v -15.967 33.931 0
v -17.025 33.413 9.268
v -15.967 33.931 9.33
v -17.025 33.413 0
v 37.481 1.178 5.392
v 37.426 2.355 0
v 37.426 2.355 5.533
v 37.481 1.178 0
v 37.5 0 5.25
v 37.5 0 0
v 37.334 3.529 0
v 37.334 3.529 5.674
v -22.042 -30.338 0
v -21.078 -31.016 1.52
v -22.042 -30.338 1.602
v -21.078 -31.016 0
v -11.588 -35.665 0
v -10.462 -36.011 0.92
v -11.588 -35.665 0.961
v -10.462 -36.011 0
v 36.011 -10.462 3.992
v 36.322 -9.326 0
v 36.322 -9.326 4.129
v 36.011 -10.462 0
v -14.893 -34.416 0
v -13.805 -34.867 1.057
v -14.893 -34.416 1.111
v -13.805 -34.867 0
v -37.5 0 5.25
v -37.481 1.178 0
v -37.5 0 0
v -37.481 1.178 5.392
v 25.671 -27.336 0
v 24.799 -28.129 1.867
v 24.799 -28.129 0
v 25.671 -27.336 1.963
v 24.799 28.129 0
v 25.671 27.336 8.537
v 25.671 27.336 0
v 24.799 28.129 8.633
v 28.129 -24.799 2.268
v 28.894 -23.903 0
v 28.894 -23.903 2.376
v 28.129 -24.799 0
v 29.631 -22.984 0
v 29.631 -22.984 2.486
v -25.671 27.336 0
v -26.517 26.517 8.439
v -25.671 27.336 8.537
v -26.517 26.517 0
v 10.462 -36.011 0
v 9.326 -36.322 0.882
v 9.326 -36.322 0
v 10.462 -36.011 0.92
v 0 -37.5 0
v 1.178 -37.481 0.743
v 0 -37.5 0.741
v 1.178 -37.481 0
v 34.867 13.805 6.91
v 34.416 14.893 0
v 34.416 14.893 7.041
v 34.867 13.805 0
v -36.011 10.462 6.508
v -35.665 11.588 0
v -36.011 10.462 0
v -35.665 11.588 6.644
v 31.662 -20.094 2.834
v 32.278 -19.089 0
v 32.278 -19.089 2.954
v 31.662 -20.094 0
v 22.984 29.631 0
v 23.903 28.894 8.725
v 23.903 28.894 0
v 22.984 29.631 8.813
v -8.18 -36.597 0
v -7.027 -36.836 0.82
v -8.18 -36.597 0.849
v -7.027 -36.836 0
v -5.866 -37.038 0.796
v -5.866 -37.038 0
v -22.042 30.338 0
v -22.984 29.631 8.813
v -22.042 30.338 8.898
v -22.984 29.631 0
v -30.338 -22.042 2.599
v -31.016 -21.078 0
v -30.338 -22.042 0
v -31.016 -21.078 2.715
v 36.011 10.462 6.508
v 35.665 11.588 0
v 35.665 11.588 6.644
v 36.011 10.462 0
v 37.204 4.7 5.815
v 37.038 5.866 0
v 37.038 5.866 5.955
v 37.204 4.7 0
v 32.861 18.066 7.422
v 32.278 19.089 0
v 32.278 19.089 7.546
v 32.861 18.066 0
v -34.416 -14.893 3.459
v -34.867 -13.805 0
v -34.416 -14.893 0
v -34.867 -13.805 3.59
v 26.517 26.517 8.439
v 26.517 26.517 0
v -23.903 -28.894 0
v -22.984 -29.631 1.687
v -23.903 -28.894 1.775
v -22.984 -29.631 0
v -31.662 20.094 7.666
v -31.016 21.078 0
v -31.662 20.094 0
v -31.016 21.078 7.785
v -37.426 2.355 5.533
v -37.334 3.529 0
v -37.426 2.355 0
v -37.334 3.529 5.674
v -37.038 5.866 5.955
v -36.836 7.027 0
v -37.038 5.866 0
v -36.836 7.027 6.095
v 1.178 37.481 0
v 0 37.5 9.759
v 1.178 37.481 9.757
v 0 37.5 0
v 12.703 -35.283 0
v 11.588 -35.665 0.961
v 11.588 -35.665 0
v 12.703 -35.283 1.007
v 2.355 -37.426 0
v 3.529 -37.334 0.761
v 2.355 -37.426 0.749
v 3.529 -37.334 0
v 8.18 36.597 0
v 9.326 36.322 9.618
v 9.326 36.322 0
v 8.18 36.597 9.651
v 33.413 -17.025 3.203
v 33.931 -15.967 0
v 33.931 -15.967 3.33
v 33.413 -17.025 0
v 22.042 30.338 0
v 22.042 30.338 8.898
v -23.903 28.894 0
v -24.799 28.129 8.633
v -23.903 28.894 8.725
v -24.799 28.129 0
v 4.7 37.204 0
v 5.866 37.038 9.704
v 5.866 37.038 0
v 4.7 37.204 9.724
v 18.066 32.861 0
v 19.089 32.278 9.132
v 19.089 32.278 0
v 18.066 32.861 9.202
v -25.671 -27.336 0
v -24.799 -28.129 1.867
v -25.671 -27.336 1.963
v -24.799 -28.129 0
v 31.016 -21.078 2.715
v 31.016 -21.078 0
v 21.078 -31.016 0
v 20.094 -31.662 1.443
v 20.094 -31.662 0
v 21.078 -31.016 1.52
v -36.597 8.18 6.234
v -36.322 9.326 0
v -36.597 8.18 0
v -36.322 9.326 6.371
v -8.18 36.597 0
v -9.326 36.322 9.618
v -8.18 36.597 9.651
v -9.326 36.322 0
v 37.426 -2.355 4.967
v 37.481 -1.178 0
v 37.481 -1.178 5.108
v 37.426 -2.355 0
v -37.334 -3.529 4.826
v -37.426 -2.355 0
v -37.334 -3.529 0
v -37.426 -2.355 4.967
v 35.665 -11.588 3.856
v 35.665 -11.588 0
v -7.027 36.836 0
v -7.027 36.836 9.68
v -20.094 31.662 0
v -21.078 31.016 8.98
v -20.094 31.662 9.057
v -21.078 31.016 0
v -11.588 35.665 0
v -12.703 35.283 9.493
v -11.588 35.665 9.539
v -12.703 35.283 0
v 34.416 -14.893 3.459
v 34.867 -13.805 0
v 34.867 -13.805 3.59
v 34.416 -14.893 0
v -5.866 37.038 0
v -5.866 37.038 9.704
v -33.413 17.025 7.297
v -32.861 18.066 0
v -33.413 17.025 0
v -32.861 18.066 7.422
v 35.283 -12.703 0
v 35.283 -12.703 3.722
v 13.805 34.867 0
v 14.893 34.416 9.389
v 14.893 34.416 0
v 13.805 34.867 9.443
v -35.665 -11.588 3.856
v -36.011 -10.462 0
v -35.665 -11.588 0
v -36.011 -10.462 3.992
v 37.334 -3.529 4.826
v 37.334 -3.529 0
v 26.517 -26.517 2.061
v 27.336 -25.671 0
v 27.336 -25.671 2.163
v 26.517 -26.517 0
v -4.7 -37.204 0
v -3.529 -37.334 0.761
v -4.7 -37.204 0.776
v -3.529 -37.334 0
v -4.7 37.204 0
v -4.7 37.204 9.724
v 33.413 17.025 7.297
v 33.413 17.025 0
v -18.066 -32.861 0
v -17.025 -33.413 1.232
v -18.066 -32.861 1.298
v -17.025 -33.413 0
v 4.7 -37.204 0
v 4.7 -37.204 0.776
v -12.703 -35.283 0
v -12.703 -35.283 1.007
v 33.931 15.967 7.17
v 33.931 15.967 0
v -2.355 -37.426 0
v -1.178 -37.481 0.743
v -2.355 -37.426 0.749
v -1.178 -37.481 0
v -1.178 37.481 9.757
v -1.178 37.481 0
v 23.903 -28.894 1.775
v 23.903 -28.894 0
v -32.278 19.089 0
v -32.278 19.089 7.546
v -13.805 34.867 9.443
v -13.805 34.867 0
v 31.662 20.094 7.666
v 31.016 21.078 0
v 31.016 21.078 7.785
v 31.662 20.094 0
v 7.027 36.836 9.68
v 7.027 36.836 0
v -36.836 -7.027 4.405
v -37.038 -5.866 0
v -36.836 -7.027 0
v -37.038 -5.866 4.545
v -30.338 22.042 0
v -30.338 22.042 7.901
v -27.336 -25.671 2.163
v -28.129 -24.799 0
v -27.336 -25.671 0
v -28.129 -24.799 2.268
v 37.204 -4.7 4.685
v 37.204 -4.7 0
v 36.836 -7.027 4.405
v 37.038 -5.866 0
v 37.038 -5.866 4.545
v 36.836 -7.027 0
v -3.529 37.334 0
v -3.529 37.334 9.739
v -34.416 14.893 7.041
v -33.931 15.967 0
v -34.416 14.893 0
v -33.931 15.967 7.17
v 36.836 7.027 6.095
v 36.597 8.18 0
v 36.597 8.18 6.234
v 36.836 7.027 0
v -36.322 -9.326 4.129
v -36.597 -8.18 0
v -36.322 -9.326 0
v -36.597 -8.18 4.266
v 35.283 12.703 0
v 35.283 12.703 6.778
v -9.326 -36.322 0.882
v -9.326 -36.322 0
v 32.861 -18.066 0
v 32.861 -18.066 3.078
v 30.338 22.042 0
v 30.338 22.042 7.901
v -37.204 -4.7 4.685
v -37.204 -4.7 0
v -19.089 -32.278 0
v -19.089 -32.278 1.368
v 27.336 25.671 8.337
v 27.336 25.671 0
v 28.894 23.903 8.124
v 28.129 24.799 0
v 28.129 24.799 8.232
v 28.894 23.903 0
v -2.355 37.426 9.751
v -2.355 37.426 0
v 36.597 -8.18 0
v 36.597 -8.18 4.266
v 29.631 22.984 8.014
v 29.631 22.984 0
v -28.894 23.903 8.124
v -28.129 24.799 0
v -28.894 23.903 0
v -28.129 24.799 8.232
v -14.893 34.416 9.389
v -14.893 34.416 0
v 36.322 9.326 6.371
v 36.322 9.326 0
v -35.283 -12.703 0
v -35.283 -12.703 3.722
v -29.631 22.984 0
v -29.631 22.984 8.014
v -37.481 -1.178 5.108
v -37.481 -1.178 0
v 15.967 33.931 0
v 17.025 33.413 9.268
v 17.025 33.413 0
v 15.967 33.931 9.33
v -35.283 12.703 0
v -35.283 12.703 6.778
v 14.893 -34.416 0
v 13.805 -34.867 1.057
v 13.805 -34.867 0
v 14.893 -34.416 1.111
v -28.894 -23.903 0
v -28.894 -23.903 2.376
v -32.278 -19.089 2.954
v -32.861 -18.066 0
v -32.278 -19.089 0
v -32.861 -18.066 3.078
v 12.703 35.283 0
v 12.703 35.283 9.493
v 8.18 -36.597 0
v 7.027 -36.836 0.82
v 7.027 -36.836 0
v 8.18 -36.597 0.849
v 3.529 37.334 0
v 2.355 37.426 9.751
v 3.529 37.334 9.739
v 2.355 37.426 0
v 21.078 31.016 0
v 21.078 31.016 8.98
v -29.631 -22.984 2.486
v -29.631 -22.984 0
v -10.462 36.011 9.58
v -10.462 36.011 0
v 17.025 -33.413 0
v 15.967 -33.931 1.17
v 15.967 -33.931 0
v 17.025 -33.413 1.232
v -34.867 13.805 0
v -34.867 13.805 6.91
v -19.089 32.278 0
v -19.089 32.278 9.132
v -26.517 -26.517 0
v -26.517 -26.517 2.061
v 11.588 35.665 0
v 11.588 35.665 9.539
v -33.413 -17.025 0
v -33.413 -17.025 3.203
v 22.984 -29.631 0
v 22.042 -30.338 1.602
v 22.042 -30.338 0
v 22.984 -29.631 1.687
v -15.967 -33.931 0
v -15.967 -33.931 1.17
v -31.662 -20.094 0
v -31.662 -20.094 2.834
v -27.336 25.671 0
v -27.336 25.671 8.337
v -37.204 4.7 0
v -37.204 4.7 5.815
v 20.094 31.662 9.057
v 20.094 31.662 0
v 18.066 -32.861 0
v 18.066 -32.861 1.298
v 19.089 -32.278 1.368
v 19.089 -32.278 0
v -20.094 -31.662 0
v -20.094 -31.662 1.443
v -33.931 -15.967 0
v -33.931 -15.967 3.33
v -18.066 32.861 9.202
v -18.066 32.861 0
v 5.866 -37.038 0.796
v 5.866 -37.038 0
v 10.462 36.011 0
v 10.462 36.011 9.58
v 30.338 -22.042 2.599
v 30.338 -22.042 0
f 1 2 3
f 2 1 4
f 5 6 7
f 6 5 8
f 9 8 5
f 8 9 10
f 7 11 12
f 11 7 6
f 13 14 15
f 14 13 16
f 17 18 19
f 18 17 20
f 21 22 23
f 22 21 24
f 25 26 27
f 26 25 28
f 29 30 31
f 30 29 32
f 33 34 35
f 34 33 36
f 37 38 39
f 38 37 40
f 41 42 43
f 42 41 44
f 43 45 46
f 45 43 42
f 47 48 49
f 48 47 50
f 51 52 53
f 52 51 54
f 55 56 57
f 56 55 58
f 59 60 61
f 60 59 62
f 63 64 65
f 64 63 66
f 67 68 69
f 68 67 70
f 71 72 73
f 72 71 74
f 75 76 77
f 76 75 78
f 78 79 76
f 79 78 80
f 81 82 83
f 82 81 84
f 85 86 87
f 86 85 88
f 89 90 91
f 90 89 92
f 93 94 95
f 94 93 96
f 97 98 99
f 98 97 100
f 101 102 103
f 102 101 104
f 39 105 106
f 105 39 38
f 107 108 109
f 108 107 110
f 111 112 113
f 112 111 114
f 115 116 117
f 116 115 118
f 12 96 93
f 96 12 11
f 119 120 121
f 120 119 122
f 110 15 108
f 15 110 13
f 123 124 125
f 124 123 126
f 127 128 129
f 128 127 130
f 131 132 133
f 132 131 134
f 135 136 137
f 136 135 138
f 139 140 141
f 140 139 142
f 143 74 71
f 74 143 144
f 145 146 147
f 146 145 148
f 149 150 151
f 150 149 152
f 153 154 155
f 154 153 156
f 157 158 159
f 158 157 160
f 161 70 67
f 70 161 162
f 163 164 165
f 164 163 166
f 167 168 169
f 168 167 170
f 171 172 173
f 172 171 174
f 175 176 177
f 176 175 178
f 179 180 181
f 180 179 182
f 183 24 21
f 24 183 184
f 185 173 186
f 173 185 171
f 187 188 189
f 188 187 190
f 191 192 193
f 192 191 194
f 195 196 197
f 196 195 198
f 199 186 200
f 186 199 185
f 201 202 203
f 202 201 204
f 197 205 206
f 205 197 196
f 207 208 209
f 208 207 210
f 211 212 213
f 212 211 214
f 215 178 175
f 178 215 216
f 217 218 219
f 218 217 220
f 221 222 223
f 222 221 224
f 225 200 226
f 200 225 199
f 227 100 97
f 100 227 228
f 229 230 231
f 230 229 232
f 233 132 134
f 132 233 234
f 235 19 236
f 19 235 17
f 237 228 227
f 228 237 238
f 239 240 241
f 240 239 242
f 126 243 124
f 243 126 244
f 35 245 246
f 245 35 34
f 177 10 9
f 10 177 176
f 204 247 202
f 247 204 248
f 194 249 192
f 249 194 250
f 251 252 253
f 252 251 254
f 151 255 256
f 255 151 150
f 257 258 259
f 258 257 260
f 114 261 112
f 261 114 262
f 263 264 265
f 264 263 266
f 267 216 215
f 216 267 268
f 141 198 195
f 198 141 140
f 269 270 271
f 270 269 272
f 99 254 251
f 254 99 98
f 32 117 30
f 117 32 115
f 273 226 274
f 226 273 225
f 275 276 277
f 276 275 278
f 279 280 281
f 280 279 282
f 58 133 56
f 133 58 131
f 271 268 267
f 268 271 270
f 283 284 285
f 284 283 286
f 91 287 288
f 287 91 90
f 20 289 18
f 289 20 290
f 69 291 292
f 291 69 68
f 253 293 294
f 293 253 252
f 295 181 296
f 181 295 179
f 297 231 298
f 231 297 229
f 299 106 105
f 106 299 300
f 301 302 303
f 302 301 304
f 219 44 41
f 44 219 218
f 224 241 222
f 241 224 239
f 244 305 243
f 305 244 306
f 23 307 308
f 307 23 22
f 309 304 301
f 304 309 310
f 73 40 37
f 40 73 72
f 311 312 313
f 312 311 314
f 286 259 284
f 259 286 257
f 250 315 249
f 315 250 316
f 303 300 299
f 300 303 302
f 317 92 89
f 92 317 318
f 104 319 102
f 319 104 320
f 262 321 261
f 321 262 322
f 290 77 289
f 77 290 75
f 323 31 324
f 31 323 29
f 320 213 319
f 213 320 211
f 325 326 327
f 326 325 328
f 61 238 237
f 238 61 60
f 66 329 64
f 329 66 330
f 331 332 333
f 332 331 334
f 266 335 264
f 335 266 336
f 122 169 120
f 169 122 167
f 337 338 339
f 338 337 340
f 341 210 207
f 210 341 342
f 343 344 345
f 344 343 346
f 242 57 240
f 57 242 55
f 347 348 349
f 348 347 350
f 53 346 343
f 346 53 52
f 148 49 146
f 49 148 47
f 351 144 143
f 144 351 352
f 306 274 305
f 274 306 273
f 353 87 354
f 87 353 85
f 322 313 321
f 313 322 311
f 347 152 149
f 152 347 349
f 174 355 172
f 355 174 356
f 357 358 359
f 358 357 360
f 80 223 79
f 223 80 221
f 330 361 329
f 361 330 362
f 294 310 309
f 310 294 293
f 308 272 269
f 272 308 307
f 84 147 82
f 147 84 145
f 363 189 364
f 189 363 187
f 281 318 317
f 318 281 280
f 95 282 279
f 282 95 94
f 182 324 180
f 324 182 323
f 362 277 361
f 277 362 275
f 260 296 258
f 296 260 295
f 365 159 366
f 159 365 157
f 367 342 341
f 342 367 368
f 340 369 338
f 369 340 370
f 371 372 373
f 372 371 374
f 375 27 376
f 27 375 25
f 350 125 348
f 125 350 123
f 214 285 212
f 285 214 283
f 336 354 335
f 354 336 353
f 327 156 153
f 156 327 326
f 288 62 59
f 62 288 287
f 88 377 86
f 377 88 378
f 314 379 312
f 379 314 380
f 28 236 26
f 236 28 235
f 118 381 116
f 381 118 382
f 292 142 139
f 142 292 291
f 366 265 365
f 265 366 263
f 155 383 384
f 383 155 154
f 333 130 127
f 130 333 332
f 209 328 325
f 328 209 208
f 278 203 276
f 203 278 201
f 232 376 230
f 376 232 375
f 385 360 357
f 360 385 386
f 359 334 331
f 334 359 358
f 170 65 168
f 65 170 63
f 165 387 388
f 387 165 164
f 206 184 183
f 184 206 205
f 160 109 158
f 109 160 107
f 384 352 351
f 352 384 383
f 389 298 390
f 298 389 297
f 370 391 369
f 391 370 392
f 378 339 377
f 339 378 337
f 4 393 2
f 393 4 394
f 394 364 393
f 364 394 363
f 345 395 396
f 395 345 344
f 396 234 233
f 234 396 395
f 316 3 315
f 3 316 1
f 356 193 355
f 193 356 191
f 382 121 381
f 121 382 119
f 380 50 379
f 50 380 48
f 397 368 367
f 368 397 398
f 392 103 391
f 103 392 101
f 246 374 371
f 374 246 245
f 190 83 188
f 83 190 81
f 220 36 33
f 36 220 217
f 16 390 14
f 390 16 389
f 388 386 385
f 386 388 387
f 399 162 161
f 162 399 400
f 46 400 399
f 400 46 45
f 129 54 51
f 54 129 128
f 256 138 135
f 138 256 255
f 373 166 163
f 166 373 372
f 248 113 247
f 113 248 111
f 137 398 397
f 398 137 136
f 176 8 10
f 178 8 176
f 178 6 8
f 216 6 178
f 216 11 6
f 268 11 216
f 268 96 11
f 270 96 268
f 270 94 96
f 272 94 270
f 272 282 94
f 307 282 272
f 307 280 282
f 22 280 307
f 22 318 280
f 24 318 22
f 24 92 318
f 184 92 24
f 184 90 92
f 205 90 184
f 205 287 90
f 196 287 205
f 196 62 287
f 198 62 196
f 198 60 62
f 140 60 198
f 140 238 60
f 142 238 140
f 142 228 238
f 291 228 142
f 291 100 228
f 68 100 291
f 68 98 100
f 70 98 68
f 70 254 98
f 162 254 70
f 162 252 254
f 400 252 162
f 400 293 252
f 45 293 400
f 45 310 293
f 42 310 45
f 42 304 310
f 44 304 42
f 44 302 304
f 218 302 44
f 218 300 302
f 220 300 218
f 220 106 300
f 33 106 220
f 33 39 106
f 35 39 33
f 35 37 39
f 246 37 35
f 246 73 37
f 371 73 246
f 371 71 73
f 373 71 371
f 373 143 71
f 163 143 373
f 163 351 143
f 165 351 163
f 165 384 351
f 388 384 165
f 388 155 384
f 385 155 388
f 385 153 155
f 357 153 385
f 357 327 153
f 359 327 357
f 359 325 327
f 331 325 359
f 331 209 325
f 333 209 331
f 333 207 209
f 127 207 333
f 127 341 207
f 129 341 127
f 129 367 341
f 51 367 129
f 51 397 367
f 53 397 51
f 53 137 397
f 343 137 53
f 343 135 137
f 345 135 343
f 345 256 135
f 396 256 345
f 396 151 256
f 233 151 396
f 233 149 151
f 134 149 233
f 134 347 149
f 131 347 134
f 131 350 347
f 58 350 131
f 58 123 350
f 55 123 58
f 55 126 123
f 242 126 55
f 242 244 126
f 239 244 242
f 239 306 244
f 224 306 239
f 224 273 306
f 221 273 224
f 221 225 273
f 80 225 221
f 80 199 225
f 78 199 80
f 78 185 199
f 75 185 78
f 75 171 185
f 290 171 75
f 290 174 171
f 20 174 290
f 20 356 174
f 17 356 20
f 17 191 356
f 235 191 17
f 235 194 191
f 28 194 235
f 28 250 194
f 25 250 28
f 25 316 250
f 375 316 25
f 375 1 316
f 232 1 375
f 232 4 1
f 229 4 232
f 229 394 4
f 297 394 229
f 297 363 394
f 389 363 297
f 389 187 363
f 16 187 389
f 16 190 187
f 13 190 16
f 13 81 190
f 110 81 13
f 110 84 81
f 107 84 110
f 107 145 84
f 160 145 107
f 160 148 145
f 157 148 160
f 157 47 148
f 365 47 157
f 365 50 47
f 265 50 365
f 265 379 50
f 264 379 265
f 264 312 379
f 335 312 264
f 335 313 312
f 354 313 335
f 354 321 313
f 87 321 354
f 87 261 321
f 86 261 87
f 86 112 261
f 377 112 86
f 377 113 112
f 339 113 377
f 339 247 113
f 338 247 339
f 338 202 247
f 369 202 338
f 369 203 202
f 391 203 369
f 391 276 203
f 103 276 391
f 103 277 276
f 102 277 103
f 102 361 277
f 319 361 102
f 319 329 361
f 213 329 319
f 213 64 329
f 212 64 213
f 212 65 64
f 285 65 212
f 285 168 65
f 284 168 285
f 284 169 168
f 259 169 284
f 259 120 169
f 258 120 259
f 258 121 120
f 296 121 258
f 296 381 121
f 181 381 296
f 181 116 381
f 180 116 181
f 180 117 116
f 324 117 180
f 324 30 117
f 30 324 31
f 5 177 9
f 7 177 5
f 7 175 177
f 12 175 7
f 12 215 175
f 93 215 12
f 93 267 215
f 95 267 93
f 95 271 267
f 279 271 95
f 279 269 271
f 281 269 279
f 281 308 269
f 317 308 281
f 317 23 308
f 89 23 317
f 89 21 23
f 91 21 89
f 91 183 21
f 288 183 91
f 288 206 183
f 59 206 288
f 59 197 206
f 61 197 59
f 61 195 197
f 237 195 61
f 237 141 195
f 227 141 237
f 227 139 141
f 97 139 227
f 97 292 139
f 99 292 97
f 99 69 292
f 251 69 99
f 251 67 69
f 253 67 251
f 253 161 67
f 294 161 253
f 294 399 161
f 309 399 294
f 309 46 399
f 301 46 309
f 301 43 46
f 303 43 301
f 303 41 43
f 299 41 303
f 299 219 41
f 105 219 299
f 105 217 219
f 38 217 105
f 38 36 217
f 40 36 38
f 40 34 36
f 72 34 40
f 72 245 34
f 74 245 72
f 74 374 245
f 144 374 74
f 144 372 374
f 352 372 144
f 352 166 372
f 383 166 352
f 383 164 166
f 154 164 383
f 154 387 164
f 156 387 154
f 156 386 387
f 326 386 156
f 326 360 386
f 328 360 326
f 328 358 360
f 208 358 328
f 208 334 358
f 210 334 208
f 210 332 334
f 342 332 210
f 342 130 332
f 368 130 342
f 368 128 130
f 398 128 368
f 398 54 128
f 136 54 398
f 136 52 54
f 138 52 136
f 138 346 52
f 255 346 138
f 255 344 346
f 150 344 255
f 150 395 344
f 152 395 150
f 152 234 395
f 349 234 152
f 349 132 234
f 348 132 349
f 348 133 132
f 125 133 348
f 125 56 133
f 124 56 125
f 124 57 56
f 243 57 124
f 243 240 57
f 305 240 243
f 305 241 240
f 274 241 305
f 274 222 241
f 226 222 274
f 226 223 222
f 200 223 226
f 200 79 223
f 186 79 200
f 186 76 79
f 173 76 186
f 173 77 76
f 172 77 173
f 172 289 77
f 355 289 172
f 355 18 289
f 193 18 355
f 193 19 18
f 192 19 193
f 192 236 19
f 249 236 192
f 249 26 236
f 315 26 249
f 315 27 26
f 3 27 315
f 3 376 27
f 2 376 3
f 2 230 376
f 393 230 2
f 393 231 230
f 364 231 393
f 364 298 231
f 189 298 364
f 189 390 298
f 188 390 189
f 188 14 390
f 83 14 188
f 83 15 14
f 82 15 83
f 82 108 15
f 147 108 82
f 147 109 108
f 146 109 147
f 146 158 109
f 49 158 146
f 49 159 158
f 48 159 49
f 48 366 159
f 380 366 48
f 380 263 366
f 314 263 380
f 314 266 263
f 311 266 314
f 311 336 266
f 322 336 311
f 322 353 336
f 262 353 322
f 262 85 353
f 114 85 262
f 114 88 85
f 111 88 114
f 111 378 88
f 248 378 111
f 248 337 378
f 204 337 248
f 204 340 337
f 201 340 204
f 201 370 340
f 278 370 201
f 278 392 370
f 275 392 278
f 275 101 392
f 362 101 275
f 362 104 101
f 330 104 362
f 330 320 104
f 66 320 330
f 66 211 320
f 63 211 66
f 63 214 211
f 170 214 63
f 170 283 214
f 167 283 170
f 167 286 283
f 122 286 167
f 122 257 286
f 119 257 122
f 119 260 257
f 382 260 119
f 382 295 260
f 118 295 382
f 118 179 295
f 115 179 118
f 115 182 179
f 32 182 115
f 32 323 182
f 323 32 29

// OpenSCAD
// Sloped riser for a Qi fast-charge puck.
//
// A 75mm-diameter disc, flat on the bottom, with a single clean planar
// slope across the top: front_height at the front edge (y = -radius),
// rising to back_height at the back edge (y = +radius). The puck sits on
// this slope, tilted back.

// ============================================================
// PRINT PROFILE (see PRINTER.md for full slicer profile values)
// ------------------------------------------------------------
// Material:    PETG Basic — the front_height default is only 0.5mm, a real
//               knife-edge; PETG's toughness resists chipping/cracking there
//               better than brittle PLA. Static compressive load only (a
//               phone resting on it), not a strength case otherwise.
// Nozzle:      0.4mm — a 0.5mm front edge is right at ~1.25 line widths for
//               a 0.4mm nozzle, resolvable but genuinely thin either way.
// Quality:     0.20mm Standard.
// Infill:      25% — solid disc under light static compressive load
//               (a resting phone), not enough load to need more.
// Orientation: print flat as modeled, base down — verified from the geometry
//               itself: the slope rises only ~7.6° from horizontal
//               (atan(10mm rise / 37.5mm radius)), well under any overhang
//               threshold, so it prints clean with zero supports needed.
// Overrides:   handle the front edge gently regardless of material — 0.5mm
//               is thin enough to be fragile even in PETG.
// ============================================================

diameter      = 75;   // disc diameter at the base
front_height  = 0.5;  // minimum thickness at the front (low) edge - keeps it printable, no knife edge
back_height   = 10;   // height at the back (high) edge
$fn           = 200;  // circle smoothness

radius = diameter / 2;

// Cutting tool: a big wedge whose bottom face is the slope plane
// (z = front_height at y=-radius, rising linearly to back_height at
// y=+radius) and which fills everything above that plane. Subtracting it
// from a solid disc leaves only the material below the slope.
module slope_wedge_cutter(half_width, cap_height) {
    y0 = -radius - 2;               // extend a couple mm past the disc edge for a clean cut
    y1 =  radius + 2;

    polyhedron(
        points = [
            [-half_width, y0, front_height], // 0
            [-half_width, y1, back_height],  // 1
            [-half_width, y1, cap_height],   // 2
            [-half_width, y0, cap_height],   // 3
            [ half_width, y0, front_height], // 4
            [ half_width, y1, back_height],  // 5
            [ half_width, y1, cap_height],   // 6
            [ half_width, y0, cap_height],   // 7
        ],
        faces = [
            [0,1,2,3],       // -x end cap
            [4,7,6,5],       // +x end cap
            [0,4,5,1],       // slope face (bottom of the wedge)
            [1,5,6,2],       // +y end face
            [2,6,7,3],       // top face
            [3,7,4,0],       // -y end face
        ]
    );
}

color("coral")
difference() {
    // solid disc, taller than the highest point of the slope
    cylinder(h = back_height + 5, r = radius);

    slope_wedge_cutter(radius + 2, back_height + 20);
}
